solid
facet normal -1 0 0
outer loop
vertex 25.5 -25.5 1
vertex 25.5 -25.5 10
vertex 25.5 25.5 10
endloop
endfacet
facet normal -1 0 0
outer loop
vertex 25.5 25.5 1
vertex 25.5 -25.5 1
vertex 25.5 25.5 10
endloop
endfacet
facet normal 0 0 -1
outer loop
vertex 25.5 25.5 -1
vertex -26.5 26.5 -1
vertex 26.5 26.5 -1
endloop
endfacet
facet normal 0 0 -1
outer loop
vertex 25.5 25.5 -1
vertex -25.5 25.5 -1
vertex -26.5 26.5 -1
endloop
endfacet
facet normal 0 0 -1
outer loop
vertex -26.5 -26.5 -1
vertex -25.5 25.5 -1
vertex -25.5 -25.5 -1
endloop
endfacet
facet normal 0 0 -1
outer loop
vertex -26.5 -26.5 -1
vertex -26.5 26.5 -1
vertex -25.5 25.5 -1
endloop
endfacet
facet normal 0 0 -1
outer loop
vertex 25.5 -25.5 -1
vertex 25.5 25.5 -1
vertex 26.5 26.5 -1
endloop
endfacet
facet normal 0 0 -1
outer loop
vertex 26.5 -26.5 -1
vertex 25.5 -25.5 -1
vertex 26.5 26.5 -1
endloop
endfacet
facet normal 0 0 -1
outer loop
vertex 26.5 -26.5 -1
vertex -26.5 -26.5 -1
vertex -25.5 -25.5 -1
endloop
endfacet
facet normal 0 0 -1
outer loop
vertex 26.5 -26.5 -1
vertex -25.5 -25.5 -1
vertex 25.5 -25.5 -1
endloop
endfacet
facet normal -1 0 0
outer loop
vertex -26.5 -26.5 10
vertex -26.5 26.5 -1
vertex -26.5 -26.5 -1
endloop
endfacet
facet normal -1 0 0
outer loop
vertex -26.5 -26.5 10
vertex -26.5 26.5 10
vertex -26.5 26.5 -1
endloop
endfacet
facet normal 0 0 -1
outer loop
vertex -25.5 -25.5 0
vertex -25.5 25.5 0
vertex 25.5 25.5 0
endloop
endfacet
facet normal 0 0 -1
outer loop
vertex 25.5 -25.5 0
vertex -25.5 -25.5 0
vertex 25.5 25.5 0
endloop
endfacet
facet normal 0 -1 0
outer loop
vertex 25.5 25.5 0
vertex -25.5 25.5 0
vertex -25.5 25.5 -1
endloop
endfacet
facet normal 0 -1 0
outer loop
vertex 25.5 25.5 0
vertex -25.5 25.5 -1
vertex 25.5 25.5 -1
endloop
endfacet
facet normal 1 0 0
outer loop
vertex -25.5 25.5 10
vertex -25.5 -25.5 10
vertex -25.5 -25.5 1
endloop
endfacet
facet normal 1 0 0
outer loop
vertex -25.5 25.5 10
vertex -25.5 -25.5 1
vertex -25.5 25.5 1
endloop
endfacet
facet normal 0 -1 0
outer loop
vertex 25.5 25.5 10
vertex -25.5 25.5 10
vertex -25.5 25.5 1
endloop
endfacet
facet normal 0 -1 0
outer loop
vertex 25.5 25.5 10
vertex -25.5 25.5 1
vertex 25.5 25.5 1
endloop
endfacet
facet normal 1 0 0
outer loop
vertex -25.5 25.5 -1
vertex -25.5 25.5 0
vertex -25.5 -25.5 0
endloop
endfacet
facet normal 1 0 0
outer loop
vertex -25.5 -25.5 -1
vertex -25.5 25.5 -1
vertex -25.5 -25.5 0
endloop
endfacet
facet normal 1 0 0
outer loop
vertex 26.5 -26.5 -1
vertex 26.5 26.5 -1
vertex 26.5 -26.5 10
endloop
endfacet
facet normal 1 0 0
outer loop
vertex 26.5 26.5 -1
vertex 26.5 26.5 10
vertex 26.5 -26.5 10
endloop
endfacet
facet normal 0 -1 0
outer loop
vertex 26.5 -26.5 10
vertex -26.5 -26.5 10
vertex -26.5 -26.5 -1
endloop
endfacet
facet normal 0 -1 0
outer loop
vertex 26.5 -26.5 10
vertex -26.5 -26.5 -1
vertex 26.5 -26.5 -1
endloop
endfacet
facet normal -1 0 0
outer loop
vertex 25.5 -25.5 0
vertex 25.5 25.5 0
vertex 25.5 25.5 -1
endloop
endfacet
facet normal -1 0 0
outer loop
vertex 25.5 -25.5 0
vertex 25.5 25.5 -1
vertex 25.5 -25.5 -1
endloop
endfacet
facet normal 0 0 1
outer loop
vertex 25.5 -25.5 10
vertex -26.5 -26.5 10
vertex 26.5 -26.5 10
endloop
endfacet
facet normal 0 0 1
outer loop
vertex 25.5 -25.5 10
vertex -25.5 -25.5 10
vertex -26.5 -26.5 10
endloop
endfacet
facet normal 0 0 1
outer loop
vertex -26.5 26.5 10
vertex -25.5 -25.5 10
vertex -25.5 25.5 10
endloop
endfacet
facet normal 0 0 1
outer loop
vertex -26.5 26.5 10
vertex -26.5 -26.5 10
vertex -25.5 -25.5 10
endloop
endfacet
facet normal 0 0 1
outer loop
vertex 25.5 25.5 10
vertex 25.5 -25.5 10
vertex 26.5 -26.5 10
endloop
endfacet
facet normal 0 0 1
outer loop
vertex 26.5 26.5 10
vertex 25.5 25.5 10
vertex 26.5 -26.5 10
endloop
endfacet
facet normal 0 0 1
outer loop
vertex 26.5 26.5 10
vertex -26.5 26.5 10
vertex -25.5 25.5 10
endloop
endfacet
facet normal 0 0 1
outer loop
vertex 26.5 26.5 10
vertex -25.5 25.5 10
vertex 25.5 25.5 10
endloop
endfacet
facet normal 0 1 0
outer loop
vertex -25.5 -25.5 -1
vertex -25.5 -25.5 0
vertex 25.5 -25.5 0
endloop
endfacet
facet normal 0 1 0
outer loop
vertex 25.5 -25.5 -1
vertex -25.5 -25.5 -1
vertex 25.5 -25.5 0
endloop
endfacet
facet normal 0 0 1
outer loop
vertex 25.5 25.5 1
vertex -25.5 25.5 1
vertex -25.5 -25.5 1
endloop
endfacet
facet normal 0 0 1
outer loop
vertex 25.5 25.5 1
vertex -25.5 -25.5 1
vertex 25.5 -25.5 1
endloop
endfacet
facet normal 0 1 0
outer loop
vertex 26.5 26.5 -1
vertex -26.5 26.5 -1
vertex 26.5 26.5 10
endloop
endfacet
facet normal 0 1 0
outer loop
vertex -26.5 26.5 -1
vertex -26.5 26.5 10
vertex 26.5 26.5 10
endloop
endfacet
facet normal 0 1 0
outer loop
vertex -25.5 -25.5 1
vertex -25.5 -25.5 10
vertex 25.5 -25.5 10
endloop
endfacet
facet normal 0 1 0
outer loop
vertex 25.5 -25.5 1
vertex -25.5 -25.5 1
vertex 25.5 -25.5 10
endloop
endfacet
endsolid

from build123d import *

# Parameters (mm, degrees)
F0_W     = 53
F0_H     = 53.000004
F1_DEPTH = 10
F2_W     = 53
F2_H     = 53.000004
F2_W_2   = 51
F2_H_2   = 51.000002
F3_DEPTH = 1
F4_W     = 51
F4_H     = 51.000002
F5_DEPTH = 9


with BuildPart() as f1:
    # F0 (on Top) → F1 (new body)
    with BuildSketch(Plane.XY):
        Rectangle(F0_W, F0_H)
    extrude(amount=F1_DEPTH)

    # F2 (on face) → F3 (join)
    with BuildSketch(Plane(origin=(0, 0, 0), x_dir=(1, 0, 0), z_dir=(0, 0, -1))):
        Rectangle(F2_W, F2_H)
        Rectangle(F2_W_2, F2_H_2, mode=Mode.SUBTRACT)
    extrude(amount=F3_DEPTH)

    # F4 (on face) → F5 (cut)
    with BuildSketch(Plane.XY.offset(10)):
        Rectangle(F4_W, F4_H)
    extrude(amount=-F5_DEPTH, mode=Mode.SUBTRACT)


solid = f1.part
